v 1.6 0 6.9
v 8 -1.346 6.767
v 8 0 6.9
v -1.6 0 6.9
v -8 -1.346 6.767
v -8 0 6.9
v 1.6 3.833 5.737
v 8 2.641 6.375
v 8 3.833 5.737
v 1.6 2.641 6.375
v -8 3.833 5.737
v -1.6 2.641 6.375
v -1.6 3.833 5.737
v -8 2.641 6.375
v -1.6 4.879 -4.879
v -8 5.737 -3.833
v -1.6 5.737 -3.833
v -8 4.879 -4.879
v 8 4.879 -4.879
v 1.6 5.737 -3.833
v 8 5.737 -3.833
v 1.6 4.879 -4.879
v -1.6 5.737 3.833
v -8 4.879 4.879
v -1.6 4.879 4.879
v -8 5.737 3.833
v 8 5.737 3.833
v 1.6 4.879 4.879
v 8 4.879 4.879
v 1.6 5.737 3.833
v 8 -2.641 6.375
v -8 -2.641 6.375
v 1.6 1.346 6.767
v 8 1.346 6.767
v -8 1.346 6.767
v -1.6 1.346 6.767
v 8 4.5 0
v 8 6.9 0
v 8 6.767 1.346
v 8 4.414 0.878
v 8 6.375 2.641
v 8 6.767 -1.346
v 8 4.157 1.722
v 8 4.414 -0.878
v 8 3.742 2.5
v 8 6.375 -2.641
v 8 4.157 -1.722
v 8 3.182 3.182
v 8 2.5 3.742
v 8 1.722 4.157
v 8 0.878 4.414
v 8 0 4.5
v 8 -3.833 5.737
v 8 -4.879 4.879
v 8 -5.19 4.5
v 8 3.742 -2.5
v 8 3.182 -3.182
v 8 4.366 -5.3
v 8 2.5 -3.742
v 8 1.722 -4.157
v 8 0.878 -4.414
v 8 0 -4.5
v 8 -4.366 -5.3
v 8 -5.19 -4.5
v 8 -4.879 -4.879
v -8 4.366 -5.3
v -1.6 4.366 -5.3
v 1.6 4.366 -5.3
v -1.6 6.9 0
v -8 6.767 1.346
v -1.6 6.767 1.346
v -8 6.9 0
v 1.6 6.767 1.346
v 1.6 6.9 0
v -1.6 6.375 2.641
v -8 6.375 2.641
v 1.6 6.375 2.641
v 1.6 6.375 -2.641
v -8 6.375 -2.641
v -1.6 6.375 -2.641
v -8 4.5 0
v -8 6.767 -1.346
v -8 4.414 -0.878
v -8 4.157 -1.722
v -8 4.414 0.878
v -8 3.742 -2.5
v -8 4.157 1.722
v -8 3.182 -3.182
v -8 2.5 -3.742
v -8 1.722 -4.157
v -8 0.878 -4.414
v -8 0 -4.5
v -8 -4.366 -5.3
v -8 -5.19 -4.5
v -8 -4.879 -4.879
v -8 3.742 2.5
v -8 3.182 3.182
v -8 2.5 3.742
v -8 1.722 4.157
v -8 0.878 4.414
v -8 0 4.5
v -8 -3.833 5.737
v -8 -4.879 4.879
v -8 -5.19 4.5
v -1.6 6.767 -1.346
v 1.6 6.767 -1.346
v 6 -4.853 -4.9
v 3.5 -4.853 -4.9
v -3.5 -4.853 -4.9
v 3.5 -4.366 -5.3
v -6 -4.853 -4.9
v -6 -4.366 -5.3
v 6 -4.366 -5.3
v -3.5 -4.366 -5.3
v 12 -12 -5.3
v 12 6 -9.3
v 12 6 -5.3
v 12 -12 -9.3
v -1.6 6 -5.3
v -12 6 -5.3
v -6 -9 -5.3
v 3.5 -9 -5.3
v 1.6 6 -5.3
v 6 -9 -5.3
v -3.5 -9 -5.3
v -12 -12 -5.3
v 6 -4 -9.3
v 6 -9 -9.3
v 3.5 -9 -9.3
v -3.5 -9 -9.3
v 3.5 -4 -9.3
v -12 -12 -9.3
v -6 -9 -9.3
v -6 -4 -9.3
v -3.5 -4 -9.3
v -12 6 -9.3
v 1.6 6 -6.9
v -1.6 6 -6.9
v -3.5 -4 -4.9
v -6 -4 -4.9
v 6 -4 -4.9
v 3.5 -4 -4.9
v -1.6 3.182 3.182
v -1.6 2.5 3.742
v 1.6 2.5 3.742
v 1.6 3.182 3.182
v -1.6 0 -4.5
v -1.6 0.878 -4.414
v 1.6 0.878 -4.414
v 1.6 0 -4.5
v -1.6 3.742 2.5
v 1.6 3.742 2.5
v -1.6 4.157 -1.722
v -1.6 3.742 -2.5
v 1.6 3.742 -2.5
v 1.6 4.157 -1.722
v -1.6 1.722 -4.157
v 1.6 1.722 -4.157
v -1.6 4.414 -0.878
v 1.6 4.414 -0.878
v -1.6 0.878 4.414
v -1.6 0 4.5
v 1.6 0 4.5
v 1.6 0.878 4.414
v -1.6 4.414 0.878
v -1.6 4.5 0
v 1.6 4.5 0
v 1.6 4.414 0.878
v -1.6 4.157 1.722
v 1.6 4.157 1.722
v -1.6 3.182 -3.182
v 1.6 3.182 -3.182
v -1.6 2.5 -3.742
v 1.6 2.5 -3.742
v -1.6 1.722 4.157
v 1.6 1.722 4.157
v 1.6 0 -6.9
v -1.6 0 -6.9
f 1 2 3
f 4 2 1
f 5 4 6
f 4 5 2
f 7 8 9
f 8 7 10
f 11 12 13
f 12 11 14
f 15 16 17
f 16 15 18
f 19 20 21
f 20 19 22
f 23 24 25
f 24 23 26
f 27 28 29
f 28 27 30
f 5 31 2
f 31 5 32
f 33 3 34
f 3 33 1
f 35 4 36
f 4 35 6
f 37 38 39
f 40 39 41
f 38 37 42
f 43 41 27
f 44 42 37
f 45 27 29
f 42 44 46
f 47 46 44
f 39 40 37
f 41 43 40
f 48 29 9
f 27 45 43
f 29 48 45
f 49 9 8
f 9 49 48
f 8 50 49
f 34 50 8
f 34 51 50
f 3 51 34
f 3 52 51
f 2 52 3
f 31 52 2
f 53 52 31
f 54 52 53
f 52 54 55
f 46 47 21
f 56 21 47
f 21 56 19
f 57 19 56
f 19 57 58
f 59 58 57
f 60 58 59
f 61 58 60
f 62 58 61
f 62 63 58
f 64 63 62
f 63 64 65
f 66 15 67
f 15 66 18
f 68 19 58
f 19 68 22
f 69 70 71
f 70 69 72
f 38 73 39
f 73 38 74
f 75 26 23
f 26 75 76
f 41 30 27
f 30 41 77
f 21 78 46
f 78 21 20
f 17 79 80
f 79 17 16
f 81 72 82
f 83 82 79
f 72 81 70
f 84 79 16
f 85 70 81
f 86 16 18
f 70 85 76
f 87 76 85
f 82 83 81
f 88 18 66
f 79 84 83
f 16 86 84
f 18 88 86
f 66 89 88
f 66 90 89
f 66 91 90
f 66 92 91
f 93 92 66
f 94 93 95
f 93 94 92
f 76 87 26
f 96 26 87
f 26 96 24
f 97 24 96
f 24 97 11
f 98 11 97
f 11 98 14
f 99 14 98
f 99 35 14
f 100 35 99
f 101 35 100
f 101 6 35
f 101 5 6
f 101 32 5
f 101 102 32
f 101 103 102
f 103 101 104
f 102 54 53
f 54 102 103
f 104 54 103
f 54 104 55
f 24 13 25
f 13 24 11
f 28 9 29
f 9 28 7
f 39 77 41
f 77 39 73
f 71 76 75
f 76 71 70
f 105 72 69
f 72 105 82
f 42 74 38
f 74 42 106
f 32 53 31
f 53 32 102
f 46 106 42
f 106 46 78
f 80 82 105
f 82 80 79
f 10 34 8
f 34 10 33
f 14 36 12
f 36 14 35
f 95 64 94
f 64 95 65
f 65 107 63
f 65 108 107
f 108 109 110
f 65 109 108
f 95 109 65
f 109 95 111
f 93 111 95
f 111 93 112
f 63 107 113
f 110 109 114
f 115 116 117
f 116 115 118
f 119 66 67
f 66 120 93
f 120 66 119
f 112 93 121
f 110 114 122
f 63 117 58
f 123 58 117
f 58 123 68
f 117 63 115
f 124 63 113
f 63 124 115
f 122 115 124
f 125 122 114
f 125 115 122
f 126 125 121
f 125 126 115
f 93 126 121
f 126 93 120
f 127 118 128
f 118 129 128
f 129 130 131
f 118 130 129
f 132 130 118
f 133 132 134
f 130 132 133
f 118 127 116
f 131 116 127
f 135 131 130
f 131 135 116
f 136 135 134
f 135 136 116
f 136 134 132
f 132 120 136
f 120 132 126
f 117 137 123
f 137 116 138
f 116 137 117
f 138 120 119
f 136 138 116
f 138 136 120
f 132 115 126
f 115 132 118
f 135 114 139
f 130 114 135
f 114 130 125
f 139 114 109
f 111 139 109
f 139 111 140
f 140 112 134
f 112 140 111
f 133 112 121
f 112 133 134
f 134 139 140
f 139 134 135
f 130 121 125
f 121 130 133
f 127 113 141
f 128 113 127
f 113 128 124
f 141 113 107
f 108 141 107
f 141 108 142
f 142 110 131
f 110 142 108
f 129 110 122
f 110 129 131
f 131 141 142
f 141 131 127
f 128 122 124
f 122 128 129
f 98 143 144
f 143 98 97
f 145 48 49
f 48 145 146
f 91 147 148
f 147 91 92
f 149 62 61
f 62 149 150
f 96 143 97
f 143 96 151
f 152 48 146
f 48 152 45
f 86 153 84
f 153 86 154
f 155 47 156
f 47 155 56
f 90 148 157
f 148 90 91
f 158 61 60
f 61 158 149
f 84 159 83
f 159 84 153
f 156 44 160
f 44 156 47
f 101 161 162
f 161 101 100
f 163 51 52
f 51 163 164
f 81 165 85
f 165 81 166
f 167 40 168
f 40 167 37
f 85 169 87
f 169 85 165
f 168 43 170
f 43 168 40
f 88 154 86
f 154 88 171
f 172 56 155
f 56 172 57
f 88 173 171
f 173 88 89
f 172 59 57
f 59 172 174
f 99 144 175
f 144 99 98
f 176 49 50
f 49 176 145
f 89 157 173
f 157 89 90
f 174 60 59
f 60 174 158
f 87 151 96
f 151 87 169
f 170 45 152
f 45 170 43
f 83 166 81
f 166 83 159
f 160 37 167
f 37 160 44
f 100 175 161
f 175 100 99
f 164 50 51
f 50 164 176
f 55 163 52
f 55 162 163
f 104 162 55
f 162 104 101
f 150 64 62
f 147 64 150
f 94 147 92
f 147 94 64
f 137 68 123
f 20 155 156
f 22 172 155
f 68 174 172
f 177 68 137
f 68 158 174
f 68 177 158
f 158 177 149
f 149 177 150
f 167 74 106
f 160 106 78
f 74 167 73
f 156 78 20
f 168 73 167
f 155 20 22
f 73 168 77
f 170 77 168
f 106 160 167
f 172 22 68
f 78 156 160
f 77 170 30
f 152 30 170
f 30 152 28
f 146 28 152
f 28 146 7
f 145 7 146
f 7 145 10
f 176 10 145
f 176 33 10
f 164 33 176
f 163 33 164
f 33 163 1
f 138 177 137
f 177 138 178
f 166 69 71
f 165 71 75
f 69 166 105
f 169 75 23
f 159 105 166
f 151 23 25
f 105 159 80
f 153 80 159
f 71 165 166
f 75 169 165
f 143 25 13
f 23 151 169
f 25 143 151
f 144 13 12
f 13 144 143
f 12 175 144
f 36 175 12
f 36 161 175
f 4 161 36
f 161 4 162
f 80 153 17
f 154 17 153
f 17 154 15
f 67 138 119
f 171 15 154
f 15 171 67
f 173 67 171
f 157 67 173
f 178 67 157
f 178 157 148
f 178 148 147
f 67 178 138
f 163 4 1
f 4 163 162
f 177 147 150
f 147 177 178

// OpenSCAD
// file: params.scad
// Общие размеры первой итерации: один отсек 3.5" и детали вокруг него.
// Корпус диска — SFF-8301, таблица 3-1, класс высоты 26.10 мм (максимум).
// Положение разъёма SATA сюда не зашито: его снимают калибром gauge.scad
// с конкретного диска и только потом переносят в окно салазок.

drive_width = 101.60;
drive_height = 26.10;
drive_length = 147.00;

wall = 4.0;
floor_t = 4.0;
lip_t = 3.0;
nib = 4.0;
side_clearance = 0.8;
top_clearance = 1.5;

front_gap = 3.0;
plate_t = 8.0;
front_extra = front_gap + plate_t;

pusher_d = 4.4;
m3_clear = 3.4;
m3_pilot = 2.6;
m3_nut_af = 5.5;
m3_nut_t = 2.8;

cavity_w = drive_width + side_clearance;
outer_w = cavity_w + 2 * wall;
wall_h = drive_height + top_clearance;
body_z = drive_length + front_extra;

strap_z = 18;
strap_t = 4.0;
strap_foot = 14.0;

plate_screw_x = [14, drive_width - 14];
plate_z0 = drive_length + front_gap;
plate_screw_z = plate_z0 + plate_t / 2;
plate_bar_h = 10;
tower_w = 28;
tower_x = drive_width / 2 - tower_w / 2;

sled_w = 78;
sled_h = 48;
sled_t = 8;
sled_window_w = 50;
sled_window_h = 18;
sled_hole_inset = 6;

// Каркас 1U. Шаг EIA — 44.45 мм, уголок 44.0 мм, чтобы соседний юнит не тёрся.
// Гнездо 8.4 мм принимает трубку до 8 мм. Хомут тянет её к внешней стенке гнезда.
// При rod_d = 6 между трубками 29 мм: пол корзины 1.6 мм, диск 26.1 мм, воздух ~1 мм.
// При 8 мм диск 26.1 мм в этот юнит уже не входит.
unit_h = 44.0;
rod_d = 6;
socket_d = 8.4;
// 10 мм хватает, чтобы трубка села и хомут её зажал. Столбик тогда 12 мм,
// и четыре корзины остаются внутри просвета 450 мм.
socket_depth = 10;
socket_wall = 1.6;
skin = 0.8;
foot = 1.6;
roof = 1.4;
tie_w = 3.2;
// Просвет между направляющими стойки 19 дюймов — 450 мм.
opening_w = 450;
bay_count = 4;
bay_gap = 1.0;
basket_wall = 1.6;
basket_clear = 0.6;
rail_t = 1.6;
// Торец разъёма выступает за ближнюю трубку к каретке, чтобы трубка не перекрыла SATA.
plug_overhang = 16;
stop_margin = 14;

socket_r = socket_d / 2;
post_x = socket_depth + 2;
axis_inset = skin + socket_r;
bottom_axis_y = foot + socket_r;
top_axis_y = unit_h - roof - socket_r;
depth_z0 = axis_inset + socket_r + socket_wall;
post_z = depth_z0 + socket_depth;
basket_w = drive_width + basket_clear + 2 * basket_wall;
inner_w = bay_count * basket_w + (bay_count - 1) * bay_gap;
frame_w = inner_w + 2 * post_x;
rod_span = drive_length - plug_overhang + stop_margin;
frame_depth = rod_span + 2 * axis_inset;
rod_y0 = foot + rod_d / 2;
rod_y1 = unit_h - roof - rod_d / 2;
rod_gap = (rod_y1 - rod_d / 2) - (rod_y0 + rod_d / 2);

// KW11-3Z: корпус около 19.8 x 10.2 x 6.4 мм, два отверстия 2.35–2.5 мм
// с шагом 9.5 мм под винты M2.
switch_hole_d = 2.5;
switch_pitch = 9.5;

$fn = 32;
// main file
// Клипса концевика. Седло садится на трубку 4–8 мм и притягивается хомутом.
// Пластина 2.4 мм вынесена в сторону каретки.
// Два паза с шагом 9.5 мм — KW11-3Z и похожие микрики, винты M2.
// Корпус KW11 около 19.8 x 10.2 x 6.4 мм, отверстия 2.35–2.5 мм.
include <params.scad>

saddle_r = socket_d / 2 + 0.3;
saddle_w = 16;
plate_l = 24;
plate_t = 2.4;
plate_drop = 12;

module endstop_clip() {
    difference() {
        union() {
            translate([-saddle_w / 2, 0, 0])
                rotate([0, 90, 0])
                    cylinder(h = saddle_w, r = saddle_r + plate_t);
            // Пластина заходит в стенку седла, иначе это отдельное тело.
            translate([-plate_l / 2, -plate_drop, -(saddle_r + plate_t + plate_t)])
                cube([plate_l, plate_drop + 6, plate_t + 1.6]);
        }

        translate([-saddle_w / 2 - 0.1, 0, 0])
            rotate([0, 90, 0])
                cylinder(h = saddle_w + 0.2, r = saddle_r);
        // Нижняя корка трубки. По Z не шире отверстия, чтобы не выесть пластину.
        translate([
            -saddle_w / 2 - 0.1,
            -(saddle_r + plate_t + 1),
            -saddle_r
        ])
            cube([saddle_w + 0.2, saddle_r + plate_t + 1, saddle_r * 2]);

        translate([-tie_w / 2, 0, -(saddle_r + plate_t)])
            cube([tie_w, saddle_r + plate_t + 0.2, (saddle_r + plate_t) * 2]);

        for (x = [-switch_pitch / 2, switch_pitch / 2]) {
            translate([
                x - switch_hole_d / 2,
                -plate_drop + 3,
                -(saddle_r + plate_t + plate_t + 0.2)
            ])
                cube([switch_hole_d, 5, plate_t + 2.2]);
        }
    }
}

endstop_clip();
